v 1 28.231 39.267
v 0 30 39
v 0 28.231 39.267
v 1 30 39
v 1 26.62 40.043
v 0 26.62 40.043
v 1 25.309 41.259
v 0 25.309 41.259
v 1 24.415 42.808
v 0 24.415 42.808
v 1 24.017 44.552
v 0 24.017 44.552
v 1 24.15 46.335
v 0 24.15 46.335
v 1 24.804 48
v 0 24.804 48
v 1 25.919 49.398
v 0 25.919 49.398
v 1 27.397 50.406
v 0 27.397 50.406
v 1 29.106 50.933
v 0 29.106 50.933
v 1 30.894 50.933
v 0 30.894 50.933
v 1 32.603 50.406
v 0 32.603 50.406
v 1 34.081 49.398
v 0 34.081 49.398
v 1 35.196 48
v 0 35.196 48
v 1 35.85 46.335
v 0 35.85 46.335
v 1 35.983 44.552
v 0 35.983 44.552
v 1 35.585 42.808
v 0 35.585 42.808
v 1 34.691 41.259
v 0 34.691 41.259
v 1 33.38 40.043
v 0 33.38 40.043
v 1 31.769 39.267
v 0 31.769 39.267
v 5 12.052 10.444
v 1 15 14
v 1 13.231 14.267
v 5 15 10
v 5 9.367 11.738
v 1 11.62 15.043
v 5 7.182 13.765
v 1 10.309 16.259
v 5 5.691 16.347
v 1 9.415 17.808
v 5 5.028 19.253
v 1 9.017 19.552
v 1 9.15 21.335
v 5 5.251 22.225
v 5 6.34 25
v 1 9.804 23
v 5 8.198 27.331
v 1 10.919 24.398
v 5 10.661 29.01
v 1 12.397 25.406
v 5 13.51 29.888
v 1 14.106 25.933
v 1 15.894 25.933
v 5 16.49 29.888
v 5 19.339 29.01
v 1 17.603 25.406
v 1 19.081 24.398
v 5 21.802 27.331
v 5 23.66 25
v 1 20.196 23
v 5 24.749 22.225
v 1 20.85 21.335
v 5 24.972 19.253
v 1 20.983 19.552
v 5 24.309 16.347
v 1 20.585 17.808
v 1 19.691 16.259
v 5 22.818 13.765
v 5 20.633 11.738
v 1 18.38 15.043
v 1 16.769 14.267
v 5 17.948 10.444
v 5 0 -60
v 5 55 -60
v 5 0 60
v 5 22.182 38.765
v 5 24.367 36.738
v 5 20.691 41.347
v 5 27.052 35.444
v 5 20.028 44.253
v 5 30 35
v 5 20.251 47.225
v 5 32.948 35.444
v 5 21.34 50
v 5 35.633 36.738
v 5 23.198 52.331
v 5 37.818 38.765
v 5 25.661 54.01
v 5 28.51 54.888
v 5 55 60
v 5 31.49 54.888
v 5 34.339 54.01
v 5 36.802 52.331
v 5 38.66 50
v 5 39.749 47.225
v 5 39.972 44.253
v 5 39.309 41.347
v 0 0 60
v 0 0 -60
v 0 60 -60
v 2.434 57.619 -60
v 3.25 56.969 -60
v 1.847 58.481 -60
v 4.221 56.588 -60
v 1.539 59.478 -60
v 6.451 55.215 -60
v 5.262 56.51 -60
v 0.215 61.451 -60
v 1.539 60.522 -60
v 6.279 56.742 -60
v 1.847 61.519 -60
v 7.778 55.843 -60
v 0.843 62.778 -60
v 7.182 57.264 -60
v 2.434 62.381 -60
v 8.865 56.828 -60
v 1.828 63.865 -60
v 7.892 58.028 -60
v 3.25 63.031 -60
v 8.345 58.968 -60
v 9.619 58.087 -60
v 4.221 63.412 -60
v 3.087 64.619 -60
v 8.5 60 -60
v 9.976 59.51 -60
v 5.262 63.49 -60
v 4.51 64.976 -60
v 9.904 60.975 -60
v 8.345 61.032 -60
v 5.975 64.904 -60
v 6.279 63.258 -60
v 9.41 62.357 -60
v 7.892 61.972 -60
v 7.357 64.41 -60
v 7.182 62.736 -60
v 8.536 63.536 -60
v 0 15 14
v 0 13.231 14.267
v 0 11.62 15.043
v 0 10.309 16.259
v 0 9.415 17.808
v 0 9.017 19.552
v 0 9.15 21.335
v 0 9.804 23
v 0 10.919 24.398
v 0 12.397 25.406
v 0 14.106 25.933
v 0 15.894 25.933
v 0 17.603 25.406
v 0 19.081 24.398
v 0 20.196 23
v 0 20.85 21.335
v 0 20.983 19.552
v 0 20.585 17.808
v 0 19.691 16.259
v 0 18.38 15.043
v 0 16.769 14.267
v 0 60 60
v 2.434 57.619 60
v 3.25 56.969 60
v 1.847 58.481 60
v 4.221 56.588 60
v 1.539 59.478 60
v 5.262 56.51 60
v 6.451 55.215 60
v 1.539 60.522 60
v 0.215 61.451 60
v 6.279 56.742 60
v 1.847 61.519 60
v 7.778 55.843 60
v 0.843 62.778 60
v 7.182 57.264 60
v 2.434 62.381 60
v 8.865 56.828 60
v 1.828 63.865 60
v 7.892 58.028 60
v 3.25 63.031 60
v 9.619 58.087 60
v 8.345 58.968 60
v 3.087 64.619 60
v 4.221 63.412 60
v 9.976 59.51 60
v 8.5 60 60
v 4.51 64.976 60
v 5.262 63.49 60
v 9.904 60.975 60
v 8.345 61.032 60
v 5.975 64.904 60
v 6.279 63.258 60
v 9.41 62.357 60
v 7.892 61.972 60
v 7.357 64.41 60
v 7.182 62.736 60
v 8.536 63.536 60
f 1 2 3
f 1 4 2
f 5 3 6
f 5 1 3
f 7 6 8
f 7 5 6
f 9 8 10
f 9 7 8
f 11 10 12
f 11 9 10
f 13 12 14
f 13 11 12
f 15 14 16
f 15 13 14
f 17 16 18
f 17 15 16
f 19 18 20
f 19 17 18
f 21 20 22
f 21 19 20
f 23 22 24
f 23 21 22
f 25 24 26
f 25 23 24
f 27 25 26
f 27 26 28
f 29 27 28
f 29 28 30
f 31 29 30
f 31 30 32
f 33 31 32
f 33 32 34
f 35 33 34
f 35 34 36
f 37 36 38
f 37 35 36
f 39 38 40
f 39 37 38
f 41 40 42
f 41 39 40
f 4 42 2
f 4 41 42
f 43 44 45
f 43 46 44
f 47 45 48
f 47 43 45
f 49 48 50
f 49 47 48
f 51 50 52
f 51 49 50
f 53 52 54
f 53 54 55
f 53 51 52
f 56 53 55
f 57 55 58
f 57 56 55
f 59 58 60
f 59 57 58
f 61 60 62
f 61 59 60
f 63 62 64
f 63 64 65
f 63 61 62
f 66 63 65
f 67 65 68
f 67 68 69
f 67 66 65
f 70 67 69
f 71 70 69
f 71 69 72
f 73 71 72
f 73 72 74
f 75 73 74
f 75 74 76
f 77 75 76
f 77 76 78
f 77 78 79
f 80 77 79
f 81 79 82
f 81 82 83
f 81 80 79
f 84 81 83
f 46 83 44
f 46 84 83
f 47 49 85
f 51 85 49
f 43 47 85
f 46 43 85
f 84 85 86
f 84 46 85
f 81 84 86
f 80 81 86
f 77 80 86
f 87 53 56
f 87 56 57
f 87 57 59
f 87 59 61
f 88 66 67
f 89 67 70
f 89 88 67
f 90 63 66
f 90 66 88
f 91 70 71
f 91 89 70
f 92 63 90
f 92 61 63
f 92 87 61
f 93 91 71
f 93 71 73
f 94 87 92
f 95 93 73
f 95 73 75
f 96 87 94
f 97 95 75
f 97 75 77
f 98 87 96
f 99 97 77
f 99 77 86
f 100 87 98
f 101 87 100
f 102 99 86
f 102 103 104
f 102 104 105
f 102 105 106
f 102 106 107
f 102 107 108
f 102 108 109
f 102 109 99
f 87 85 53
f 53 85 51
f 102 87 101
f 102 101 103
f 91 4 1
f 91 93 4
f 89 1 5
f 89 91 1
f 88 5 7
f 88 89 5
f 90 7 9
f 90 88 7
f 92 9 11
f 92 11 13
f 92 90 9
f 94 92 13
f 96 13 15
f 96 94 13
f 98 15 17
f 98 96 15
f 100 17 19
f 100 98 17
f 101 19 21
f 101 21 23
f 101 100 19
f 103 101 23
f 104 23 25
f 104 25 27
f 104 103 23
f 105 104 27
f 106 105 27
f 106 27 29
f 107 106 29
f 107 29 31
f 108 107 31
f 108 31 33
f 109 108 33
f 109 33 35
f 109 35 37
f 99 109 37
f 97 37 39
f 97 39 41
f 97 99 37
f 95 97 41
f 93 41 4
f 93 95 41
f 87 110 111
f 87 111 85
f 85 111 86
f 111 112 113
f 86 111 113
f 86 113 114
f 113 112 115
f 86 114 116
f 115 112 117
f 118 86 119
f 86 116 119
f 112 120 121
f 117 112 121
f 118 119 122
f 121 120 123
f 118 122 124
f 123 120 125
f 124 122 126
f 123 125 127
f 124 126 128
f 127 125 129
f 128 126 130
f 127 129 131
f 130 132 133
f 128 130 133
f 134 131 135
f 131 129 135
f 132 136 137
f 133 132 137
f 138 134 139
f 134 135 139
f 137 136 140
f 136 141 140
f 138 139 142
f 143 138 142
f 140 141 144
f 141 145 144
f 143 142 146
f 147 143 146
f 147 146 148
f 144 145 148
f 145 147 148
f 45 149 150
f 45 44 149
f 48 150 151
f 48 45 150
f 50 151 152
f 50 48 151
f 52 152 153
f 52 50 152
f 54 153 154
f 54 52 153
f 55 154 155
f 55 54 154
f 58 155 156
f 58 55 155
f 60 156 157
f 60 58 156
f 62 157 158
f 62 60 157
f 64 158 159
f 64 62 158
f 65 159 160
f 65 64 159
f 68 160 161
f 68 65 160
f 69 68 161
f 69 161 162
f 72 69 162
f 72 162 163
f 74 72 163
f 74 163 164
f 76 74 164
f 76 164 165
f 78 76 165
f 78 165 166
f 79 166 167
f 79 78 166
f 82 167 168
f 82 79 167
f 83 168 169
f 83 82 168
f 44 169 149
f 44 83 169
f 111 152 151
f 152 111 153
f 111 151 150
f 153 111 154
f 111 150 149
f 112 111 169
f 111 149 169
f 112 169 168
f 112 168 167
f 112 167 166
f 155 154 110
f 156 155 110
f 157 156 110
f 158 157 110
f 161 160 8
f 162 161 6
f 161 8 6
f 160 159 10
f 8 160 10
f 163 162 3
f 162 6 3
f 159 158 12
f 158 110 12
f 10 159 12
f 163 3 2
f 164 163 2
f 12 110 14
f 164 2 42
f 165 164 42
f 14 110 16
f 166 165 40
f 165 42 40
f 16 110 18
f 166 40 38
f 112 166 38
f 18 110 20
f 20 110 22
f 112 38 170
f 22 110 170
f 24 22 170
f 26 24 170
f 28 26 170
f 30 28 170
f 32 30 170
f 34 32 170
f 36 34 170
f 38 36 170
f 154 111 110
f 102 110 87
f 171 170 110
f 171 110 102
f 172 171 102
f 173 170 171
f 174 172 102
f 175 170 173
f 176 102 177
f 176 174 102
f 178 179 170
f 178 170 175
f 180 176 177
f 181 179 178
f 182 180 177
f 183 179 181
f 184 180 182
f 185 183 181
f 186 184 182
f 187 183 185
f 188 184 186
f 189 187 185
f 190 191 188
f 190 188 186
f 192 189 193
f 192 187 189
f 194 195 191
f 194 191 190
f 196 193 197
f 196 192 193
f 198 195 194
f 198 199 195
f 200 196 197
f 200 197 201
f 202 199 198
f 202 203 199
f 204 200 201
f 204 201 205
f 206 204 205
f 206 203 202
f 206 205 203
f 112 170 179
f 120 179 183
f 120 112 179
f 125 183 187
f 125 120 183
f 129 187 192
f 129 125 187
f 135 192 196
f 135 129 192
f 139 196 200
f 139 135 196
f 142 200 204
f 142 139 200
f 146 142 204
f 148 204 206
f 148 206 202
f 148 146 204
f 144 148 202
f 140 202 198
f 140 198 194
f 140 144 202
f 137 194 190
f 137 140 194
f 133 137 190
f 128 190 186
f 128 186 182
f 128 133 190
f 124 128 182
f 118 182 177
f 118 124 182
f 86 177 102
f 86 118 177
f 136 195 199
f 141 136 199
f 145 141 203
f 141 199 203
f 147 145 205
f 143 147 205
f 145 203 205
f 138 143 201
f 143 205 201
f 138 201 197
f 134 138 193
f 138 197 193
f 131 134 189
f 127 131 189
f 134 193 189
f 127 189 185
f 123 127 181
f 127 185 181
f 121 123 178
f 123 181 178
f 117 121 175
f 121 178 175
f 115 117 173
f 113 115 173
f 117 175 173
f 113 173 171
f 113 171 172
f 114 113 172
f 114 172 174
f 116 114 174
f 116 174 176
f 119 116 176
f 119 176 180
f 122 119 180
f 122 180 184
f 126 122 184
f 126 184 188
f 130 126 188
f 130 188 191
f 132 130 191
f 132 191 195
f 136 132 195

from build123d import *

# Parameters (mm, degrees)
SKETCH_1_W                  = 5
SKETCH_1_H                  = 60
EXTRUDE_2_DEPTH             = 60
SKETCH_2_R                  = 5
SKETCH_3_R                  = 3.5
CUT_EXTRUDE_1_DEPTH         = 137.839321834
HOLE_WIZARD_M101_AT_2_COUNT = 2
HOLE_WIZARD_M101_AT_2_PITCH = 29.154759474


with BuildPart() as part:
    # Эскиз1 → Вытянуть-Тонкостенный2 (new, symmetric)
    with BuildSketch(Plane.XY):
        with Locations((2.5, 30)):
            Rectangle(SKETCH_1_W, SKETCH_1_H)
    extrude(amount=EXTRUDE_2_DEPTH, both=True)

    # По траектории1: sweep along a curve in space
    with BuildLine() as sweep_1_path:
        Line((0, 60, 60), (0, 60, -60))
    # Эскиз2 → По траектории1 (sweep)
    with BuildSketch(Plane.XY.offset(60)):
        with Locations((5, 60)):
            Circle(SKETCH_2_R)
    sweep(path=sweep_1_path.line)

    # Эскиз3 → Вырез-Вытянуть1 (cut, through all)
    with BuildSketch(Plane.XY.offset(60)):
        with Locations((5, 60)):
            Circle(SKETCH_3_R)
    extrude(amount=-CUT_EXTRUDE_1_DEPTH, mode=Mode.SUBTRACT)

    # Эскиз8 → Зенковка для  винта с плоской головкой M101 (revolve, cut)
    with BuildSketch(Plane(origin=(5, 30, 45), x_dir=(0, 0, -1), z_dir=(0, 1, 0))):
        Polygon((0, 0), (0, 5), (6, 5), (6, 4), (10, 0), align=None)
    hole_wizard_m101 = revolve(axis=Axis((11.35, 30, 45), (-1, 0, 0)), mode=Mode.SUBTRACT)

    # Зенковка для  винта с плоской головкой M101 at 2: Зенковка для  винта с плоской головкой M101 ×2
    with Locations(*[Vector(0, -0.5144957554275265, -0.8574929257125442) * (i * HOLE_WIZARD_M101_AT_2_PITCH) for i in range(1, HOLE_WIZARD_M101_AT_2_COUNT)]):
        add(hole_wizard_m101, mode=Mode.SUBTRACT)


solid = part.part
